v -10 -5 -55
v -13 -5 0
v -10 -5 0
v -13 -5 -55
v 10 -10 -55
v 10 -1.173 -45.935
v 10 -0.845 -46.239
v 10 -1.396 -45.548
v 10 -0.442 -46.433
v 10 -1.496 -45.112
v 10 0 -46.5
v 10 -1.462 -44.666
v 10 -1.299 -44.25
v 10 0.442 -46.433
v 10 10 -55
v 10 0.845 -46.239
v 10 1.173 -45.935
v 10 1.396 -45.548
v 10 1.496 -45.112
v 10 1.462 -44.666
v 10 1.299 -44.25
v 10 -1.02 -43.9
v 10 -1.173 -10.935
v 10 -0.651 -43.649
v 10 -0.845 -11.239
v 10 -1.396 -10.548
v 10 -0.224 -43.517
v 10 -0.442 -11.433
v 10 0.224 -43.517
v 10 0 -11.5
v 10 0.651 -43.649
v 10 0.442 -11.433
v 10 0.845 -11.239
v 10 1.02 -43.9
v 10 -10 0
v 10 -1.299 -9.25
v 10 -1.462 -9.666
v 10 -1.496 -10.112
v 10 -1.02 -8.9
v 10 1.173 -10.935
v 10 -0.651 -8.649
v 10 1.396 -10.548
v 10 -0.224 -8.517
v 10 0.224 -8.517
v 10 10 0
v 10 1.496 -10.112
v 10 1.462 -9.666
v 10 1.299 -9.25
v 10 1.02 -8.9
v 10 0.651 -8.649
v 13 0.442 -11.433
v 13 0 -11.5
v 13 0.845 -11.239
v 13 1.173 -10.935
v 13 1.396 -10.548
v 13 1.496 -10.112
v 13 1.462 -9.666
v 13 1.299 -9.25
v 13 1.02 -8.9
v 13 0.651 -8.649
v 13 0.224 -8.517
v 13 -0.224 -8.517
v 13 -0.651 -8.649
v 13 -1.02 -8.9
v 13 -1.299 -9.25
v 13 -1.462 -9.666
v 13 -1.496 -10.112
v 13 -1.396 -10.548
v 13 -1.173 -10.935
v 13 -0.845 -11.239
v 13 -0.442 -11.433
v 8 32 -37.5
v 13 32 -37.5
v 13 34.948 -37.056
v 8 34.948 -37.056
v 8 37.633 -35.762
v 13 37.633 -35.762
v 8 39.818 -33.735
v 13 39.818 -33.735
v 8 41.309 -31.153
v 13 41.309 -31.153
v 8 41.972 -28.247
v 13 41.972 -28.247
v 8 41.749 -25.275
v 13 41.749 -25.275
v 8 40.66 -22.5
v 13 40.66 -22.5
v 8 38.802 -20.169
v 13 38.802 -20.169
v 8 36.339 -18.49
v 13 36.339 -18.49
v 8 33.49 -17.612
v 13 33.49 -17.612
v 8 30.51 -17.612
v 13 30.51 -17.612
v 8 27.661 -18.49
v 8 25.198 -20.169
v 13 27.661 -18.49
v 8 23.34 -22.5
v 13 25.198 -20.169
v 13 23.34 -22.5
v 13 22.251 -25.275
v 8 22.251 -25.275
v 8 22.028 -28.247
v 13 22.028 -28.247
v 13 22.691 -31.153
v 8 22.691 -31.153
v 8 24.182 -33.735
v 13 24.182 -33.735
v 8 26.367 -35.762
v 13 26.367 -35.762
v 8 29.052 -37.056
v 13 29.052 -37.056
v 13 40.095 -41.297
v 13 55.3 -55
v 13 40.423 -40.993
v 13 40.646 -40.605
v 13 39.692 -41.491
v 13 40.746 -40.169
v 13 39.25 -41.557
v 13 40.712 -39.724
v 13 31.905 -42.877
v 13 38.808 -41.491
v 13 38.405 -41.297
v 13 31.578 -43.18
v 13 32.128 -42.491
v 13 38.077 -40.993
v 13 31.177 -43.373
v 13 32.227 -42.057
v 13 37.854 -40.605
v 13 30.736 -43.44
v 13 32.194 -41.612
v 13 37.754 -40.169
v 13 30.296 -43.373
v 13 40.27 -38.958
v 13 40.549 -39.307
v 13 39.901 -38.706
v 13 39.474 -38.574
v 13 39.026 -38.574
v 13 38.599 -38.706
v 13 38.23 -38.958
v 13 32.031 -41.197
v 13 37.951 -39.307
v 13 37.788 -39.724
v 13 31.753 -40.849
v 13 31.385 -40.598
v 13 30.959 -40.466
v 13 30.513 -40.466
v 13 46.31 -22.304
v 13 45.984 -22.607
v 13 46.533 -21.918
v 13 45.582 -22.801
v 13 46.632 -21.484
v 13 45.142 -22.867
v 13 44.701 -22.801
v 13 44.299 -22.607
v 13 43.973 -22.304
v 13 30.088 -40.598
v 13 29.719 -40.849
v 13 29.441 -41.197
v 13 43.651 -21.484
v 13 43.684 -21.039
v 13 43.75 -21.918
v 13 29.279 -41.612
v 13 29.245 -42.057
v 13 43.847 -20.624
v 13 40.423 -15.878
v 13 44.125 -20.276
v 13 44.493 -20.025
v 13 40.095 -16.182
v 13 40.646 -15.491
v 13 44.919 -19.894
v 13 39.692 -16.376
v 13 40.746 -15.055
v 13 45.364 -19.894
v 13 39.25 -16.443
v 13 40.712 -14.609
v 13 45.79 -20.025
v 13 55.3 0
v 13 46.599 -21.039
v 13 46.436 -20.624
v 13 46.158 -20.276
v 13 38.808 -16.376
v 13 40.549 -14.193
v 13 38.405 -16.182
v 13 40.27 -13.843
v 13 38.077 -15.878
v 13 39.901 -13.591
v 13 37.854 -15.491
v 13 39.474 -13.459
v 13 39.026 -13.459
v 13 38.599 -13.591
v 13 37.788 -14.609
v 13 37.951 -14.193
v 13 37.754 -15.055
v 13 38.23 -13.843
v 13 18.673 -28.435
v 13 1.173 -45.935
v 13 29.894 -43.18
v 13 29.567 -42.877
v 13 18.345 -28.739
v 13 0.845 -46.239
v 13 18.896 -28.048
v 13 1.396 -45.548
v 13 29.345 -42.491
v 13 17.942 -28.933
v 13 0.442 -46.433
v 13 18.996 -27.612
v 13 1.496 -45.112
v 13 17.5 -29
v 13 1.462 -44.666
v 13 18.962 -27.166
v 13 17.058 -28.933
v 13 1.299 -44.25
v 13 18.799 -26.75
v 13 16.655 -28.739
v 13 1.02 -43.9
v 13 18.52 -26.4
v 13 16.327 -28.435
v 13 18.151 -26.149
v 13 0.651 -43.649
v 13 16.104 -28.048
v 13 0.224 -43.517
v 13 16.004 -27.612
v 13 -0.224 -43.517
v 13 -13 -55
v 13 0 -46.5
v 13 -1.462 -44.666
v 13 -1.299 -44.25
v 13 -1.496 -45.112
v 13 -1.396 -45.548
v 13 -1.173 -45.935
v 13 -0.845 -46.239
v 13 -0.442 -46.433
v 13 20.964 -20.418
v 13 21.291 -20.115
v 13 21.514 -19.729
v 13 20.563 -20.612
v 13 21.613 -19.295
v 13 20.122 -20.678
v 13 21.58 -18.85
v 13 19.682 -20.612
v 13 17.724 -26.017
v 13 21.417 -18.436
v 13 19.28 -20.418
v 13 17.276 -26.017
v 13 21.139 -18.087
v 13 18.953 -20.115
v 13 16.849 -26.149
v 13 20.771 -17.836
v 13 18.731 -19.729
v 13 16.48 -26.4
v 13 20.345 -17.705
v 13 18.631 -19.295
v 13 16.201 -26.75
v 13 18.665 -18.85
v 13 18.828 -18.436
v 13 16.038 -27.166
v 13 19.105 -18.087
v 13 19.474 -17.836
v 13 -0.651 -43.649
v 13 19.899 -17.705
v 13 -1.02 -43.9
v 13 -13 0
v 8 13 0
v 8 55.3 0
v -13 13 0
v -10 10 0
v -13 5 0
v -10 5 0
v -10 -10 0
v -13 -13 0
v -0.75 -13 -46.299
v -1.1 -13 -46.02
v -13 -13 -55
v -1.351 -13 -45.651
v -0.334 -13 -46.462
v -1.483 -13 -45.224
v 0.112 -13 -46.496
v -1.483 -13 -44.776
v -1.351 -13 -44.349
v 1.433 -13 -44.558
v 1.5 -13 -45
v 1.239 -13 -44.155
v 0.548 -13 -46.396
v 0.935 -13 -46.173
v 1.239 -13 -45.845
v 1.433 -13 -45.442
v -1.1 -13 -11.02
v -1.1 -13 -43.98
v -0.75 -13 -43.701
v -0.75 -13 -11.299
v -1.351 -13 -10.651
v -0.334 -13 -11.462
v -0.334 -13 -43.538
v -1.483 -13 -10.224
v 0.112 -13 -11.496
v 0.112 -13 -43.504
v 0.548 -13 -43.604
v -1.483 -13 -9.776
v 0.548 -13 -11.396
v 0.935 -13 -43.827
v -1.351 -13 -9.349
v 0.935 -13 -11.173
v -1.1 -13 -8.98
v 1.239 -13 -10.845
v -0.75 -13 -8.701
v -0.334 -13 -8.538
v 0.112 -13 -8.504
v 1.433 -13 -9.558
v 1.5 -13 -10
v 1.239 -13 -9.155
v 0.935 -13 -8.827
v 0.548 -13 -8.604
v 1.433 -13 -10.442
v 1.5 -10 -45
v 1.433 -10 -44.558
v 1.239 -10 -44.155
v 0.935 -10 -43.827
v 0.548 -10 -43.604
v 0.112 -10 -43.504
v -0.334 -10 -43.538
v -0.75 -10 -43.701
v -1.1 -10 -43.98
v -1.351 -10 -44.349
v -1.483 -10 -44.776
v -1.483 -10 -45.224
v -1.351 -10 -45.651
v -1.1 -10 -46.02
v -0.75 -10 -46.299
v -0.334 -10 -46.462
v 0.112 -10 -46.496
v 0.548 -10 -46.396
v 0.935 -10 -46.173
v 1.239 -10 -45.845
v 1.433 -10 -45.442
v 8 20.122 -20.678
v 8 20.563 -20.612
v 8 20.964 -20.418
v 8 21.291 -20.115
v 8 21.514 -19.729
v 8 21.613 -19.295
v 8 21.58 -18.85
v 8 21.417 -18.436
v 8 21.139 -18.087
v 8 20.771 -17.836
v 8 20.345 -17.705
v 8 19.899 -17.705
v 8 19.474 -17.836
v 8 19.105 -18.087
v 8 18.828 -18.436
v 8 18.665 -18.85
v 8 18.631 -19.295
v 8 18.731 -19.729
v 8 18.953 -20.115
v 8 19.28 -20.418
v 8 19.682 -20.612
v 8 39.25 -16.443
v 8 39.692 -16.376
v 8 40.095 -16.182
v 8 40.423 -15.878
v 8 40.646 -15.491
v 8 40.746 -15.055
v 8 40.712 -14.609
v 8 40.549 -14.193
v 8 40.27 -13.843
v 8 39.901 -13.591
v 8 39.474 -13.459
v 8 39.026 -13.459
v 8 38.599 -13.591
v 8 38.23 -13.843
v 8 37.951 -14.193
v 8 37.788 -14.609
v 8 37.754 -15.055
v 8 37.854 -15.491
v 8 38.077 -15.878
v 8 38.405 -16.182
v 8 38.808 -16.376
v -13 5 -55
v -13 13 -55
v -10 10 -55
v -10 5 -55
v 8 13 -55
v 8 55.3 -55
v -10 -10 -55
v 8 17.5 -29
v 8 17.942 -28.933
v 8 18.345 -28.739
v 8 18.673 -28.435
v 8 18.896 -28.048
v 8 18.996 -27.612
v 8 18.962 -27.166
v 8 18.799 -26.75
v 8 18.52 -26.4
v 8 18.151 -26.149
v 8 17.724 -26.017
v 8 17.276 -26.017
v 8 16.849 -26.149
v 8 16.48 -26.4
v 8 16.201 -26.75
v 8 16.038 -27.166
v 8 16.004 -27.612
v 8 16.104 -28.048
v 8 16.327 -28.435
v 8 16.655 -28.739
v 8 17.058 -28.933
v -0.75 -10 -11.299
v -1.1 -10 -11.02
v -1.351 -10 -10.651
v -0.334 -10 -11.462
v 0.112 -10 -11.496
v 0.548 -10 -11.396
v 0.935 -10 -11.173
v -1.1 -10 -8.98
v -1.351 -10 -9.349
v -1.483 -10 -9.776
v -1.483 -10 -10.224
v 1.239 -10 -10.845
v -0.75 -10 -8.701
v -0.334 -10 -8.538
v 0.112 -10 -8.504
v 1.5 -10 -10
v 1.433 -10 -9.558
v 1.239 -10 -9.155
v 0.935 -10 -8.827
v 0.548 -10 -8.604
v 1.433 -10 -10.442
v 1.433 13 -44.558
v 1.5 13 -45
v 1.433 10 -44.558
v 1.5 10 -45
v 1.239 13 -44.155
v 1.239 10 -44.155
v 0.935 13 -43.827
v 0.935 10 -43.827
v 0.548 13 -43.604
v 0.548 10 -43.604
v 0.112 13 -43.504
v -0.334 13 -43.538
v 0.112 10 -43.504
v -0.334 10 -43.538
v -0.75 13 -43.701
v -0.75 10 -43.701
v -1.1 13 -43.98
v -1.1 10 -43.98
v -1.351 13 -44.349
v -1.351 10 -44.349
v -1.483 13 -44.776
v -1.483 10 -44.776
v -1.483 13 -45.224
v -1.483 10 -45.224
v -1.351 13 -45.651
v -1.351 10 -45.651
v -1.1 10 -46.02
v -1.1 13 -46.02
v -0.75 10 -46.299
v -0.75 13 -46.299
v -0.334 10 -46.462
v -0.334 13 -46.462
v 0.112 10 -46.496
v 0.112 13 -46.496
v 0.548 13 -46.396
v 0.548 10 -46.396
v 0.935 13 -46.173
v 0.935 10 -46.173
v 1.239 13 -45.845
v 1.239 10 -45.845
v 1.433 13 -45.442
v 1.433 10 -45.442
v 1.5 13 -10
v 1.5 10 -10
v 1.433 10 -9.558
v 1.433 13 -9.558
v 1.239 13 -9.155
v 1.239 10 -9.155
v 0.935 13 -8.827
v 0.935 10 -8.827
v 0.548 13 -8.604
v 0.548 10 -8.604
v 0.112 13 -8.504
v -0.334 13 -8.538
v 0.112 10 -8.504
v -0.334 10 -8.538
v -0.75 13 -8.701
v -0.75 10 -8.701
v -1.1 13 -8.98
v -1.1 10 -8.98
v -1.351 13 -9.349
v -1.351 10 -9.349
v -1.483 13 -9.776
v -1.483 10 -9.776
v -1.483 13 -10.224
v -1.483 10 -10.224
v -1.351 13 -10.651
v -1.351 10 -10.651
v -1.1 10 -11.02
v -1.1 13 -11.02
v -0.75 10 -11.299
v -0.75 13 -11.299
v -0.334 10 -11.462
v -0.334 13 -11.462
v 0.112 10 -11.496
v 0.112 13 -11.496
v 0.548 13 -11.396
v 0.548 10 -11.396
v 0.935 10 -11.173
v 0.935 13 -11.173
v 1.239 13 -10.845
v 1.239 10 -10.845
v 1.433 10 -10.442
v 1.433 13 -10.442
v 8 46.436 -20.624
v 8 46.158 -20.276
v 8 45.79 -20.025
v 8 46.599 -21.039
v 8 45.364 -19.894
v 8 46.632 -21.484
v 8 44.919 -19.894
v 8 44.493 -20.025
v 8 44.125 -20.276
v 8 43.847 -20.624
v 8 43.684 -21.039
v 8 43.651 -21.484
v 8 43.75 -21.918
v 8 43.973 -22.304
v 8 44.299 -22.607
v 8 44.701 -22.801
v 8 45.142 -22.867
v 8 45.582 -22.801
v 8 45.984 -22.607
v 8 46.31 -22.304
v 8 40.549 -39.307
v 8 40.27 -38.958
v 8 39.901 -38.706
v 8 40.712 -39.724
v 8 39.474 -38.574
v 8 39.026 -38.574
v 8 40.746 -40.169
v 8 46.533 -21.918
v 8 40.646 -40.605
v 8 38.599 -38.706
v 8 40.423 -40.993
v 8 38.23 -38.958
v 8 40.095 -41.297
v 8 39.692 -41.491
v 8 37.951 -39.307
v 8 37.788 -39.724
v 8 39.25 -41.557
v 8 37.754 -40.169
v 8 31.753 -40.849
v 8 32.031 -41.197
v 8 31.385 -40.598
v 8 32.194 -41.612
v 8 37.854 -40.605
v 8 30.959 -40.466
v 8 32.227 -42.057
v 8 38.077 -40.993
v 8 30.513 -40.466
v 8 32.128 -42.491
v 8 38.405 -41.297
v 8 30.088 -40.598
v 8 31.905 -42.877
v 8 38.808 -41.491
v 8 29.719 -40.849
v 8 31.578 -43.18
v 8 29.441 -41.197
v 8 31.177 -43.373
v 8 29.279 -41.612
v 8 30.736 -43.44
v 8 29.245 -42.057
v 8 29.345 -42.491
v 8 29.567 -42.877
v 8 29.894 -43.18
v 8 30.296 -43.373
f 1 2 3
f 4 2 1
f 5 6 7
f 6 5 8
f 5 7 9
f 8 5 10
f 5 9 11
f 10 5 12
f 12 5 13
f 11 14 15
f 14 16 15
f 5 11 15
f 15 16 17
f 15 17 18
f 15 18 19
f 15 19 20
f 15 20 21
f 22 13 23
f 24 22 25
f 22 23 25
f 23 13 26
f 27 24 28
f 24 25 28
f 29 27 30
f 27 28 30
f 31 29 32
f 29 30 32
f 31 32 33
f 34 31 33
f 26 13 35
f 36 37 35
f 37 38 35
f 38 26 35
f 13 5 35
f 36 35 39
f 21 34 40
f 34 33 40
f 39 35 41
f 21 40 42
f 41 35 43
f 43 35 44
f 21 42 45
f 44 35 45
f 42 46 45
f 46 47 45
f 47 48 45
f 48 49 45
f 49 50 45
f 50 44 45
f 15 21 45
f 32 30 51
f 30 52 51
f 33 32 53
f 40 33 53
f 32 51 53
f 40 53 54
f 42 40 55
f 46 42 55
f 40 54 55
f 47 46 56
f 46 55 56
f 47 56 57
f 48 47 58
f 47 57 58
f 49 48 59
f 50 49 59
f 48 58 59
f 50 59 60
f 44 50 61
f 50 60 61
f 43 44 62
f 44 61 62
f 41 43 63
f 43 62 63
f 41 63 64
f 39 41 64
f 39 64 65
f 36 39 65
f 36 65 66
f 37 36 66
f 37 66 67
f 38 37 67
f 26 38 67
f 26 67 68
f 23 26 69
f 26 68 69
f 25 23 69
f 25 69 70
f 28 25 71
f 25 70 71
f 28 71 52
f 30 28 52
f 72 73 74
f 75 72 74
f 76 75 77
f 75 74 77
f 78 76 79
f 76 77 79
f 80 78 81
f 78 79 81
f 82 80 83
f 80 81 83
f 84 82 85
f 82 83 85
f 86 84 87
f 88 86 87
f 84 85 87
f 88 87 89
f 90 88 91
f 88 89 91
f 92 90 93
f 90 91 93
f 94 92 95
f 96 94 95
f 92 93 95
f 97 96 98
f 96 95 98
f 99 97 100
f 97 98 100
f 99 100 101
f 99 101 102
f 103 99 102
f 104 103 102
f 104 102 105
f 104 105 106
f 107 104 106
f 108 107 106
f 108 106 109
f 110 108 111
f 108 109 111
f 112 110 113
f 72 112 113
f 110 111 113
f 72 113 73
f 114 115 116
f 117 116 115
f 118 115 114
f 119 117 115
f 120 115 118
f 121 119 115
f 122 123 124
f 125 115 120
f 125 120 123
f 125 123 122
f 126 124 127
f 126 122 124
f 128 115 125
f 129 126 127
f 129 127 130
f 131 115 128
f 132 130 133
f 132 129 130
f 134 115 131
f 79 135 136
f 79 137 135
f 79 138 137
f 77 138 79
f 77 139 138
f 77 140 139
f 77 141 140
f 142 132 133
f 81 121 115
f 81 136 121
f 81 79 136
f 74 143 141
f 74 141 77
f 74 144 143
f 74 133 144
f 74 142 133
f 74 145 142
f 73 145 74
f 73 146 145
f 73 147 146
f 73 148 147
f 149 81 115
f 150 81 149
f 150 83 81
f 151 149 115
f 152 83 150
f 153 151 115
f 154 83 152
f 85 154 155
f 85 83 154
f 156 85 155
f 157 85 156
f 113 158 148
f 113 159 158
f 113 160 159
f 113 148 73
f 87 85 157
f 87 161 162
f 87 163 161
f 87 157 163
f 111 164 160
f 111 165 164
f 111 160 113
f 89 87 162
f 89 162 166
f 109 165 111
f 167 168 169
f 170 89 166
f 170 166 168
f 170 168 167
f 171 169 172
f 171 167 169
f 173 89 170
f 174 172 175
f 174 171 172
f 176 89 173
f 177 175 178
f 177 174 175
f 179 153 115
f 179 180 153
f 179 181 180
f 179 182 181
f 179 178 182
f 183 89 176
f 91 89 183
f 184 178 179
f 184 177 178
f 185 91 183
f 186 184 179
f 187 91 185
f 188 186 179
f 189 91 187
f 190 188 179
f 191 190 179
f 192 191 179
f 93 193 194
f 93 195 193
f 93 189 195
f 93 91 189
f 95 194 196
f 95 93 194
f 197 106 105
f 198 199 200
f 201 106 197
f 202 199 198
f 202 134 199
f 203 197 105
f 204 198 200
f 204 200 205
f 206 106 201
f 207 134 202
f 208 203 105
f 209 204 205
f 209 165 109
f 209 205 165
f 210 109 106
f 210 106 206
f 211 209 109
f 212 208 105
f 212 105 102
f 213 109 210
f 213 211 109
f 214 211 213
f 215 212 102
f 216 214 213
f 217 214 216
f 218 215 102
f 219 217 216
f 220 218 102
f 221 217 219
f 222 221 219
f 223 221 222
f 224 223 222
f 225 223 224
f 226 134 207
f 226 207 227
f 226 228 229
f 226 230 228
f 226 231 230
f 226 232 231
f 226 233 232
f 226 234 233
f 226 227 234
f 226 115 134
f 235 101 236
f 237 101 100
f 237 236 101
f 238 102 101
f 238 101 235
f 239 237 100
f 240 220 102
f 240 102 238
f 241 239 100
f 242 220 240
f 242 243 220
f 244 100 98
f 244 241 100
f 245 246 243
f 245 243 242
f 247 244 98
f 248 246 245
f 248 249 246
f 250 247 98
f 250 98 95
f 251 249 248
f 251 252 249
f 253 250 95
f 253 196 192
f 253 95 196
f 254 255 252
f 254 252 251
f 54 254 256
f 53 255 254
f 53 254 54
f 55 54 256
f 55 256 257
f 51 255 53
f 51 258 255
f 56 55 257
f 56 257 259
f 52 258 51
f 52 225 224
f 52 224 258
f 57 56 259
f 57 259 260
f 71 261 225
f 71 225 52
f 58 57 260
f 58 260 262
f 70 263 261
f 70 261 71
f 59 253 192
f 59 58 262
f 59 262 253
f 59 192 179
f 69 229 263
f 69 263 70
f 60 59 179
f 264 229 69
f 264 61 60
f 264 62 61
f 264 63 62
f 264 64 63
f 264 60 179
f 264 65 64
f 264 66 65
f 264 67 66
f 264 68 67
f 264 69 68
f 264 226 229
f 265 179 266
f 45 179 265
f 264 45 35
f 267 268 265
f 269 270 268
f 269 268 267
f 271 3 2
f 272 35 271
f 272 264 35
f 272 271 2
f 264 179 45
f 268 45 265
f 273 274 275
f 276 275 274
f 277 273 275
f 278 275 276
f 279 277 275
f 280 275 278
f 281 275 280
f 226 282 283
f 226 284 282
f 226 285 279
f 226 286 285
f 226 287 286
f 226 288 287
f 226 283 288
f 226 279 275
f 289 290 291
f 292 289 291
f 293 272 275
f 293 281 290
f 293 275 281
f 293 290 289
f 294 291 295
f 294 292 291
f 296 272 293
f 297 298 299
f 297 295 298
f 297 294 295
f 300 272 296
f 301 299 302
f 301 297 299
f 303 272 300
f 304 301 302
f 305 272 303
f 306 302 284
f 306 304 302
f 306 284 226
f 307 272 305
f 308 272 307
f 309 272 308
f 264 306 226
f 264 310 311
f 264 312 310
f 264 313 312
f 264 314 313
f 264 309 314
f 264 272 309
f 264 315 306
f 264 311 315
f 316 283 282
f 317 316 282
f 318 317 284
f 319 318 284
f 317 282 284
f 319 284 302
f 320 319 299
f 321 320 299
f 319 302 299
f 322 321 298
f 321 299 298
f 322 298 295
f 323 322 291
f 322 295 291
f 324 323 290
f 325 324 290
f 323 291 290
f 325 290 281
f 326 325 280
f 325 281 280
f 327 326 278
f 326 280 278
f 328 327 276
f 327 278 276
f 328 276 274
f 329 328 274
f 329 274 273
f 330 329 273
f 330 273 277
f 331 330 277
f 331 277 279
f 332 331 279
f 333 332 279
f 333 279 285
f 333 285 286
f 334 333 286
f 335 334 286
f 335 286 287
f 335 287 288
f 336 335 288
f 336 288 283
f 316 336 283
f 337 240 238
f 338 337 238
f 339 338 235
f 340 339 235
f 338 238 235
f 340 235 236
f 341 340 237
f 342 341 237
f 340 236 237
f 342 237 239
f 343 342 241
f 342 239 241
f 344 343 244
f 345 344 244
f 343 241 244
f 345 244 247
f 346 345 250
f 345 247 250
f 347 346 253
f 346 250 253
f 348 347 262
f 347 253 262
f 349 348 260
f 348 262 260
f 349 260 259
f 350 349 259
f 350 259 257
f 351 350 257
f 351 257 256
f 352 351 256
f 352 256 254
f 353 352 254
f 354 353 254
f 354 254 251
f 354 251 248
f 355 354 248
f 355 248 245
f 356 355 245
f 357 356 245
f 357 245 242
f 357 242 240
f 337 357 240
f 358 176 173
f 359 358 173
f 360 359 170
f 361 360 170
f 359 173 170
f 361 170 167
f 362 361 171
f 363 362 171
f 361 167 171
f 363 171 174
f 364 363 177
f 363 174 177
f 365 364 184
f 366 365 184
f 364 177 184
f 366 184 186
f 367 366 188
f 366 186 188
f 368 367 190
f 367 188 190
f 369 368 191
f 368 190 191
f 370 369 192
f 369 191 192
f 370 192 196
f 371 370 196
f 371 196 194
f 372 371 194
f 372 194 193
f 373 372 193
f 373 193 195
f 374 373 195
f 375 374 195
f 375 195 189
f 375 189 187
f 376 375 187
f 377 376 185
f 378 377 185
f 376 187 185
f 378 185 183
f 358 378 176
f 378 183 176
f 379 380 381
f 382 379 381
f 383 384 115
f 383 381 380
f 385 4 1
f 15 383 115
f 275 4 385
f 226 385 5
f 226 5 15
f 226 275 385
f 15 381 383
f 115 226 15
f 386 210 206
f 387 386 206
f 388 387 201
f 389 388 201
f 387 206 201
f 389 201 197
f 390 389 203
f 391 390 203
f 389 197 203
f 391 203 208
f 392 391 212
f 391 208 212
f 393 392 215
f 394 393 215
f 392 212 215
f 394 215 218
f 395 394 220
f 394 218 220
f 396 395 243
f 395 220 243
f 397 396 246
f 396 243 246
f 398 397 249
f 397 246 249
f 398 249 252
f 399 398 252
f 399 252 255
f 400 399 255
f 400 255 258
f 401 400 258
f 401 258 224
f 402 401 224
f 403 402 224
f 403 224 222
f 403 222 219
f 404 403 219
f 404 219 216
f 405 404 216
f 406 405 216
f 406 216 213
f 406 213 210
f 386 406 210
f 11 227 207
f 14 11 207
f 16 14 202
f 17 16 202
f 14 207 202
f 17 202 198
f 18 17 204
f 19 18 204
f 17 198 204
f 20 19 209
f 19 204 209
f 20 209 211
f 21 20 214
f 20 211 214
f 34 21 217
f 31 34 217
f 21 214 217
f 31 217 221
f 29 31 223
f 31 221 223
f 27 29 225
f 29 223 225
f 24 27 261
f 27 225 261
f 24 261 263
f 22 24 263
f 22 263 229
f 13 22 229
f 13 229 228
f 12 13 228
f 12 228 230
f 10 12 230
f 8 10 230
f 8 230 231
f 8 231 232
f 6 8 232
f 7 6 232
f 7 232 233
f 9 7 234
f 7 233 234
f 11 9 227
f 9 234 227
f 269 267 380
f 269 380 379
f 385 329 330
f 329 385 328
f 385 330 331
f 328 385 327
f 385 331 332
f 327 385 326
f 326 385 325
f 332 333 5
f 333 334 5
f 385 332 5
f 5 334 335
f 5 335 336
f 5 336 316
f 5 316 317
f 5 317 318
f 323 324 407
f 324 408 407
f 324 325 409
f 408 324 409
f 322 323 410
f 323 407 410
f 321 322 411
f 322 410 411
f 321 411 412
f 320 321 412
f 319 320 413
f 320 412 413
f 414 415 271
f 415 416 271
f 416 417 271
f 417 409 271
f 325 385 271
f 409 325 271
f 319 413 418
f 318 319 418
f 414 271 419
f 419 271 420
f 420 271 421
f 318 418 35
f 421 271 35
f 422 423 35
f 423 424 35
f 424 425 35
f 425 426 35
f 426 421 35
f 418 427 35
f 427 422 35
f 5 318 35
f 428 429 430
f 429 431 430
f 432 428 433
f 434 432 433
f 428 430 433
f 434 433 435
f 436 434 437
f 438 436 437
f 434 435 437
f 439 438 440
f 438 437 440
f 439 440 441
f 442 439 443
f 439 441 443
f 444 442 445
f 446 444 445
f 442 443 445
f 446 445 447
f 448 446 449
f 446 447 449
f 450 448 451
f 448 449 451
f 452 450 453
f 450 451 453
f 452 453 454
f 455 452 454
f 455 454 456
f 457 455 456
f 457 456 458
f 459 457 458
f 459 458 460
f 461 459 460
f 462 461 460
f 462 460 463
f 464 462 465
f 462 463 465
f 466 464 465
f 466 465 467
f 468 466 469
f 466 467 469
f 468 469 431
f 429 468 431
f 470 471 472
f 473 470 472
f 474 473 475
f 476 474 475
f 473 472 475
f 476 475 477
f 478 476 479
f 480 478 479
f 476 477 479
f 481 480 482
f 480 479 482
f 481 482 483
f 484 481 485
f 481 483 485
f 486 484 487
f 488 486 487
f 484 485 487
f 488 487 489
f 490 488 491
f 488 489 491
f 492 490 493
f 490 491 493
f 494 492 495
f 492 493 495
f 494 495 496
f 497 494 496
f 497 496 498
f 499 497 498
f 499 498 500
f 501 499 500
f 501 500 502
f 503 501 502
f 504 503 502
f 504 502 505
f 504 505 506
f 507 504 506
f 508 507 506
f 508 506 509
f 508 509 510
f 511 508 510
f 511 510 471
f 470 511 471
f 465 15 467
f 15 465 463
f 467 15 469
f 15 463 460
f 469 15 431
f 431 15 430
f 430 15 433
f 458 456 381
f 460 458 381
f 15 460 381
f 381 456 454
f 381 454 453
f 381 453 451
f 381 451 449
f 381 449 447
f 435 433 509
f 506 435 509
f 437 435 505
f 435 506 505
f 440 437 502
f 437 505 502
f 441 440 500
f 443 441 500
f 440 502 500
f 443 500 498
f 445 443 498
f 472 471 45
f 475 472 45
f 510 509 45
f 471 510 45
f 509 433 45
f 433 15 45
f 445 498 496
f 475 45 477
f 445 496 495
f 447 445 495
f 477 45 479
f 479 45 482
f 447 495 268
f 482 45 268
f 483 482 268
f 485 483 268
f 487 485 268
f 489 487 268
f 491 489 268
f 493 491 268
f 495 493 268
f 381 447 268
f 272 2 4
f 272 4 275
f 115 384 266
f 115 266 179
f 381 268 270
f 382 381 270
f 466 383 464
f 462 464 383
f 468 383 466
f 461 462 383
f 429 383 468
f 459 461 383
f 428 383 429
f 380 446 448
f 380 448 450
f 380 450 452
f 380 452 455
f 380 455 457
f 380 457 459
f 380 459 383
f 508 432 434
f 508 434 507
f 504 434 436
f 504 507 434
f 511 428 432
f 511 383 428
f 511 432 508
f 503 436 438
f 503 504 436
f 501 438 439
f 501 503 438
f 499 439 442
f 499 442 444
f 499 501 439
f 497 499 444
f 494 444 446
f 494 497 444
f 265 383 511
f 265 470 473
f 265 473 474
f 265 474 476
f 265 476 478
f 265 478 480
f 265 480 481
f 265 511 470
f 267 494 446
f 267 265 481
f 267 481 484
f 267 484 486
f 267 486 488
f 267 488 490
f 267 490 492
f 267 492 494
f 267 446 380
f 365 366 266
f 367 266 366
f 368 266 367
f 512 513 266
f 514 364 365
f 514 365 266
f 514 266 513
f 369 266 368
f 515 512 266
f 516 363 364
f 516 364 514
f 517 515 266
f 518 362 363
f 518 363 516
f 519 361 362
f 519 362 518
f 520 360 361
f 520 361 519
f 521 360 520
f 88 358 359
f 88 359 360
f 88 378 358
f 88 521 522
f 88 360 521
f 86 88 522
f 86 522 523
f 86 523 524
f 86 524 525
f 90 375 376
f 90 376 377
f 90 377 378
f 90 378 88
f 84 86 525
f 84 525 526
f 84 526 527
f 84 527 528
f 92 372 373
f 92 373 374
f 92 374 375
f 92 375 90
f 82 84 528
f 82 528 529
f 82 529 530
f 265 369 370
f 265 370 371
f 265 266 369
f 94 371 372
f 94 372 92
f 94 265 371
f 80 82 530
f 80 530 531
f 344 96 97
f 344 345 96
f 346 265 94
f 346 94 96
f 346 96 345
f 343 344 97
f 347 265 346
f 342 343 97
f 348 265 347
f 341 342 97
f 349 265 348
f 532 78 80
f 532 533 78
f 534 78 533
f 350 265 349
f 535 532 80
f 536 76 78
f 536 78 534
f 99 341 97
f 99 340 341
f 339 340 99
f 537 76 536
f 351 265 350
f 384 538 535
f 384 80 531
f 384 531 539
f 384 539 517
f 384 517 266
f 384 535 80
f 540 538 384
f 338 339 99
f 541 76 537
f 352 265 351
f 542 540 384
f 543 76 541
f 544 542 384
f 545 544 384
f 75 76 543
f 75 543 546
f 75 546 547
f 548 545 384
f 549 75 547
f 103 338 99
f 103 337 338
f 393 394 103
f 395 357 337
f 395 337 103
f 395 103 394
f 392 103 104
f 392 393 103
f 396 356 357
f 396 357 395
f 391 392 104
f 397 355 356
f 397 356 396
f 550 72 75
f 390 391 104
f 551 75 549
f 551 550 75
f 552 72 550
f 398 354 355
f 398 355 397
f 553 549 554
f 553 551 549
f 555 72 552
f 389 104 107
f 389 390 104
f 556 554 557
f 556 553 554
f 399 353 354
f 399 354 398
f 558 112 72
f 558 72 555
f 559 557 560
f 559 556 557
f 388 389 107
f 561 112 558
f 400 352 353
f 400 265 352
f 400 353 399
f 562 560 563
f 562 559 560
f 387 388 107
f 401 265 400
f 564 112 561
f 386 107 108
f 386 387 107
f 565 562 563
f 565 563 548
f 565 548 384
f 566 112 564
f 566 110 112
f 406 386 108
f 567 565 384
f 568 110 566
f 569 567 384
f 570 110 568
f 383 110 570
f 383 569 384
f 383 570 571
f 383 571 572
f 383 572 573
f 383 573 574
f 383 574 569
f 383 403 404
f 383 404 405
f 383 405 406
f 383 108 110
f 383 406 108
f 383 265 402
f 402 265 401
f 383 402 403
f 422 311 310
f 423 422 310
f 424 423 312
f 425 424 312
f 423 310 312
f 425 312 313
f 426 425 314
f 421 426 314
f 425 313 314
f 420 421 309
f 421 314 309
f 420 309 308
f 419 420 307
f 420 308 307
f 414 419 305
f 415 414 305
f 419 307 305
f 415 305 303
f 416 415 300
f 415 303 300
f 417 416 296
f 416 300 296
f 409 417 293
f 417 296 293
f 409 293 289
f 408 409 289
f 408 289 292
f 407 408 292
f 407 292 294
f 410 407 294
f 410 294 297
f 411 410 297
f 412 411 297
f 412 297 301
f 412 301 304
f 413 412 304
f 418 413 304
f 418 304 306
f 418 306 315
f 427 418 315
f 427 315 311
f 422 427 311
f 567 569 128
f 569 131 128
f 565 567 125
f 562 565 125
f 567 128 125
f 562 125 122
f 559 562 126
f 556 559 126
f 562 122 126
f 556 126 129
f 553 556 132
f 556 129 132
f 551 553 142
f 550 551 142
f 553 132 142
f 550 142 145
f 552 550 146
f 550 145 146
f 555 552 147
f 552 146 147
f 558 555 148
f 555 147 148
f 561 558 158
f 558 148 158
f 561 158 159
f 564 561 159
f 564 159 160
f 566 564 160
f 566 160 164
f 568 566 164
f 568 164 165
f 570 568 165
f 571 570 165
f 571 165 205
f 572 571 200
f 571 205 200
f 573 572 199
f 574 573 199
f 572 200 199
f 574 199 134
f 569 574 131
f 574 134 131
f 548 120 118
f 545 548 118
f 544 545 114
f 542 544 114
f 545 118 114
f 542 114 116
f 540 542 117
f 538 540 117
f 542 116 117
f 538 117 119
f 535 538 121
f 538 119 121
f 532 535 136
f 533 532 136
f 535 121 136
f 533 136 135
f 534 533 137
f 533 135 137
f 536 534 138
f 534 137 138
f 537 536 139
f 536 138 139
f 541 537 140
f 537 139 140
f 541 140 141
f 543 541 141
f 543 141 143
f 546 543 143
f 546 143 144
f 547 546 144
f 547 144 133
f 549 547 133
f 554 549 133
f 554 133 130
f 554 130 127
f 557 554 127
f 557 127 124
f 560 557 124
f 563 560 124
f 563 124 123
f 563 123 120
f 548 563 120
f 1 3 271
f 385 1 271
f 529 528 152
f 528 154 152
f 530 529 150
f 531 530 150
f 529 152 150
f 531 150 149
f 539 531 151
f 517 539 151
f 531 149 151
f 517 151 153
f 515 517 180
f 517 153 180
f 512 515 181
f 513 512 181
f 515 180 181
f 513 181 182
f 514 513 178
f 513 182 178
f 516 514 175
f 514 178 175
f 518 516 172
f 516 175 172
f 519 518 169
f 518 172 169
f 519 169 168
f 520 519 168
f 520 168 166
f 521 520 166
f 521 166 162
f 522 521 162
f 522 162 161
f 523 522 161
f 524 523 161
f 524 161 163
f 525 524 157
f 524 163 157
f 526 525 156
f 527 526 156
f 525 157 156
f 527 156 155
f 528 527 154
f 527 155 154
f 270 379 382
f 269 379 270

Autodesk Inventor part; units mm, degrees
ref_plane "YZ Plane" through (0, 0, 0) normal (1, 0, 0) x (0, 1, 0)
ref_plane "XZ Plane" through (0, 0, 0) normal (0, 1, 0) x (-1, 0, 0)
ref_plane "XY Plane" through (0, 0, 0) normal (0, 0, 1) x (1, 0, 0)
sketch "Sketch1" plane through (0, 0, 0) normal (0, 0, 1) x (1, 0, 0)
  line L0 (10, 10) -> (-10, 10) construction
  line L1 (-10, 10) -> (-10, -10) construction
  line L2 (-10, -10) -> (10, -10) construction
  line L3 (10, -10) -> (10, 10) construction
  line L4 (-7, -7) -> (-7, 7) construction
  line L5 (-7, 7) -> (7, 7) construction
  line L6 (7, 7) -> (7, -7) construction
  line L7 (7, -7) -> (-7, -7) construction
  line L8 (10, 10) -> (-10, 10)
  line L9 (-10, 10) -> (-10, -10)
  line L10 (-10, -10) -> (10, -10)
  line L11 (10, -10) -> (10, 10)
  line L12 (13, 13) -> (-13, 13)
  line L13 (-13, 13) -> (-13, -13)
  line L14 (-13, -13) -> (13, -13)
  line L15 (13, -13) -> (13, 13)
  point P0 (0, 0)
  dimension "d1" = 3
  dimension "d2" = 3
  dimension "d3" = 3
  dimension "d4" = 3
extrude "Extrusion1" add sketch "Sketch1" against normal blind 55
sketch "Sketch2" plane through (-13, -13, 0) normal (-1, 0, 0) x (0, 0, 1)
  line L0 (-80.4804, 18) -> (40.5, 18)
  line L1 (40.5, 18) -> (40.5, 8)
  line L2 (40.5, 8) -> (-80.4804, 8)
  line L3 (-80.4804, 8) -> (-80.4804, 18)
  line L4 (0, 26) -> (-55, 26) projected
  point P0 (0, 13)
  dimension "d7" = 10
  dimension "d8" = 8
extrude "Extrusion2" cut sketch "Sketch2" against normal blind 15.3125
sketch "Sketch3" plane through (-13, 13, 0) normal (0, 1, 0) x (1, 0, 0)
  line L0 (26, 0) -> (0, 0) projected
  line L1 (3, 55) -> (23, 55) projected
  line L2 (26, 0) -> (21, 0)
  line L3 (21, 0) -> (21, 55)
  line L4 (21, 55) -> (26, 55)
  line L5 (26, 55) -> (26, 0)
  point P0 (13, 0)
  dimension "d11" = 5
extrude "Extrusion3" add sketch "Sketch3" along normal blind 42.3
sketch "Sketch4" plane through (13, -13, 0) normal (1, 0, 0) x (0, 0, -1)
  line L0 (0, 26) -> (55, 26) projected
  circle A0 centre (27.5, 45) radius 18
  line L1 (0, 68.3) -> (55, 68.3) projected
  circle A1 centre (27.5, 45) radius 3
  point P0 (0, 13)
  point P1 (27.5, 68.3)
  dimension "d14" = 36
  dimension "d15" = 19
  dimension "d16" = 6
extrude "Extrusion4" cut sketch "Sketch4" against normal blind 42.3 contours A1
sketch "Sketch5" plane through (13, -13, 0) normal (1, 0, 0) x (0, 0, -1)
  circle A0 centre (27.5, 45) radius 3 projected
  circle A1 centre (27.5, 45) radius 10
  point P0 (0, 13)
  dimension "d19" = 20
extrude "Extrusion5" cut sketch "Sketch5" against normal blind 42.3
sketch "Sketch6" plane through (13, -13, 0) normal (1, 0, 0) x (0, 0, -1)
  circle A0 centre (27.5, 30.5) radius 1.5 projected
  circle A1 centre (19.1831, 33.1223) radius 1.495 projected
  circle A2 centre (14.9426, 52.25) radius 1.5 projected
  circle A3 centre (21.372, 58.1415) radius 1.495 projected
  circle A4 centre (40.0574, 52.25) radius 1.5 projected
  circle A5 centre (41.9448, 43.7362) radius 1.495 projected
  point P0 (0, 13)
extrude "Extrusion6" cut sketch "Sketch6" against normal blind 42.3
sketch "Sketch7" plane through (13, -13, 0) normal (1, 0, 0) x (0, 0, -1)
  circle A0 centre (10, 13) radius 1.5
  circle A1 centre (45, 13) radius 1.5
  line L0 (0, 0) -> (0, 68.3) projected
  line L1 (55, 0) -> (55, 68.3) projected
  point P0 (0, 13)
  dimension "d24" = 3
  dimension "d25" = 3
  dimension "d26" = 10
  dimension "d27" = 10
extrude "Extrusion7" cut sketch "Sketch7" against normal blind 10
sketch "Sketch8" plane through (-13, -13, 0) normal (0, -1, 0) x (1, 0, 0)
  circle A0 centre (13, -10) radius 1.5
  circle A1 centre (13, -45) radius 1.5
  line L0 (26, -55) -> (0, -55) projected
  line L1 (0, 0) -> (26, 0) projected
  point P0 (13, 0)
  point P1 (13, 0)
  point P2 (13, 0)
  dimension "d30" = 3
  dimension "d31" = 3
  dimension "d32" = 10
  dimension "d33" = 10
extrude "Extrusion8" cut sketch "Sketch8" against normal through all
properties part number "enc holder"
